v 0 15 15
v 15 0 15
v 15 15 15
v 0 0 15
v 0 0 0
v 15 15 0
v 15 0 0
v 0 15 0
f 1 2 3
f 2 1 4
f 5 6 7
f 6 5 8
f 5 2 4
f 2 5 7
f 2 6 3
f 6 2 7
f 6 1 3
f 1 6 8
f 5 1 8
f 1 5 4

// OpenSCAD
// expect: wall is set twice
wall = 2;
cube(wall * 5);
wall = 3;
